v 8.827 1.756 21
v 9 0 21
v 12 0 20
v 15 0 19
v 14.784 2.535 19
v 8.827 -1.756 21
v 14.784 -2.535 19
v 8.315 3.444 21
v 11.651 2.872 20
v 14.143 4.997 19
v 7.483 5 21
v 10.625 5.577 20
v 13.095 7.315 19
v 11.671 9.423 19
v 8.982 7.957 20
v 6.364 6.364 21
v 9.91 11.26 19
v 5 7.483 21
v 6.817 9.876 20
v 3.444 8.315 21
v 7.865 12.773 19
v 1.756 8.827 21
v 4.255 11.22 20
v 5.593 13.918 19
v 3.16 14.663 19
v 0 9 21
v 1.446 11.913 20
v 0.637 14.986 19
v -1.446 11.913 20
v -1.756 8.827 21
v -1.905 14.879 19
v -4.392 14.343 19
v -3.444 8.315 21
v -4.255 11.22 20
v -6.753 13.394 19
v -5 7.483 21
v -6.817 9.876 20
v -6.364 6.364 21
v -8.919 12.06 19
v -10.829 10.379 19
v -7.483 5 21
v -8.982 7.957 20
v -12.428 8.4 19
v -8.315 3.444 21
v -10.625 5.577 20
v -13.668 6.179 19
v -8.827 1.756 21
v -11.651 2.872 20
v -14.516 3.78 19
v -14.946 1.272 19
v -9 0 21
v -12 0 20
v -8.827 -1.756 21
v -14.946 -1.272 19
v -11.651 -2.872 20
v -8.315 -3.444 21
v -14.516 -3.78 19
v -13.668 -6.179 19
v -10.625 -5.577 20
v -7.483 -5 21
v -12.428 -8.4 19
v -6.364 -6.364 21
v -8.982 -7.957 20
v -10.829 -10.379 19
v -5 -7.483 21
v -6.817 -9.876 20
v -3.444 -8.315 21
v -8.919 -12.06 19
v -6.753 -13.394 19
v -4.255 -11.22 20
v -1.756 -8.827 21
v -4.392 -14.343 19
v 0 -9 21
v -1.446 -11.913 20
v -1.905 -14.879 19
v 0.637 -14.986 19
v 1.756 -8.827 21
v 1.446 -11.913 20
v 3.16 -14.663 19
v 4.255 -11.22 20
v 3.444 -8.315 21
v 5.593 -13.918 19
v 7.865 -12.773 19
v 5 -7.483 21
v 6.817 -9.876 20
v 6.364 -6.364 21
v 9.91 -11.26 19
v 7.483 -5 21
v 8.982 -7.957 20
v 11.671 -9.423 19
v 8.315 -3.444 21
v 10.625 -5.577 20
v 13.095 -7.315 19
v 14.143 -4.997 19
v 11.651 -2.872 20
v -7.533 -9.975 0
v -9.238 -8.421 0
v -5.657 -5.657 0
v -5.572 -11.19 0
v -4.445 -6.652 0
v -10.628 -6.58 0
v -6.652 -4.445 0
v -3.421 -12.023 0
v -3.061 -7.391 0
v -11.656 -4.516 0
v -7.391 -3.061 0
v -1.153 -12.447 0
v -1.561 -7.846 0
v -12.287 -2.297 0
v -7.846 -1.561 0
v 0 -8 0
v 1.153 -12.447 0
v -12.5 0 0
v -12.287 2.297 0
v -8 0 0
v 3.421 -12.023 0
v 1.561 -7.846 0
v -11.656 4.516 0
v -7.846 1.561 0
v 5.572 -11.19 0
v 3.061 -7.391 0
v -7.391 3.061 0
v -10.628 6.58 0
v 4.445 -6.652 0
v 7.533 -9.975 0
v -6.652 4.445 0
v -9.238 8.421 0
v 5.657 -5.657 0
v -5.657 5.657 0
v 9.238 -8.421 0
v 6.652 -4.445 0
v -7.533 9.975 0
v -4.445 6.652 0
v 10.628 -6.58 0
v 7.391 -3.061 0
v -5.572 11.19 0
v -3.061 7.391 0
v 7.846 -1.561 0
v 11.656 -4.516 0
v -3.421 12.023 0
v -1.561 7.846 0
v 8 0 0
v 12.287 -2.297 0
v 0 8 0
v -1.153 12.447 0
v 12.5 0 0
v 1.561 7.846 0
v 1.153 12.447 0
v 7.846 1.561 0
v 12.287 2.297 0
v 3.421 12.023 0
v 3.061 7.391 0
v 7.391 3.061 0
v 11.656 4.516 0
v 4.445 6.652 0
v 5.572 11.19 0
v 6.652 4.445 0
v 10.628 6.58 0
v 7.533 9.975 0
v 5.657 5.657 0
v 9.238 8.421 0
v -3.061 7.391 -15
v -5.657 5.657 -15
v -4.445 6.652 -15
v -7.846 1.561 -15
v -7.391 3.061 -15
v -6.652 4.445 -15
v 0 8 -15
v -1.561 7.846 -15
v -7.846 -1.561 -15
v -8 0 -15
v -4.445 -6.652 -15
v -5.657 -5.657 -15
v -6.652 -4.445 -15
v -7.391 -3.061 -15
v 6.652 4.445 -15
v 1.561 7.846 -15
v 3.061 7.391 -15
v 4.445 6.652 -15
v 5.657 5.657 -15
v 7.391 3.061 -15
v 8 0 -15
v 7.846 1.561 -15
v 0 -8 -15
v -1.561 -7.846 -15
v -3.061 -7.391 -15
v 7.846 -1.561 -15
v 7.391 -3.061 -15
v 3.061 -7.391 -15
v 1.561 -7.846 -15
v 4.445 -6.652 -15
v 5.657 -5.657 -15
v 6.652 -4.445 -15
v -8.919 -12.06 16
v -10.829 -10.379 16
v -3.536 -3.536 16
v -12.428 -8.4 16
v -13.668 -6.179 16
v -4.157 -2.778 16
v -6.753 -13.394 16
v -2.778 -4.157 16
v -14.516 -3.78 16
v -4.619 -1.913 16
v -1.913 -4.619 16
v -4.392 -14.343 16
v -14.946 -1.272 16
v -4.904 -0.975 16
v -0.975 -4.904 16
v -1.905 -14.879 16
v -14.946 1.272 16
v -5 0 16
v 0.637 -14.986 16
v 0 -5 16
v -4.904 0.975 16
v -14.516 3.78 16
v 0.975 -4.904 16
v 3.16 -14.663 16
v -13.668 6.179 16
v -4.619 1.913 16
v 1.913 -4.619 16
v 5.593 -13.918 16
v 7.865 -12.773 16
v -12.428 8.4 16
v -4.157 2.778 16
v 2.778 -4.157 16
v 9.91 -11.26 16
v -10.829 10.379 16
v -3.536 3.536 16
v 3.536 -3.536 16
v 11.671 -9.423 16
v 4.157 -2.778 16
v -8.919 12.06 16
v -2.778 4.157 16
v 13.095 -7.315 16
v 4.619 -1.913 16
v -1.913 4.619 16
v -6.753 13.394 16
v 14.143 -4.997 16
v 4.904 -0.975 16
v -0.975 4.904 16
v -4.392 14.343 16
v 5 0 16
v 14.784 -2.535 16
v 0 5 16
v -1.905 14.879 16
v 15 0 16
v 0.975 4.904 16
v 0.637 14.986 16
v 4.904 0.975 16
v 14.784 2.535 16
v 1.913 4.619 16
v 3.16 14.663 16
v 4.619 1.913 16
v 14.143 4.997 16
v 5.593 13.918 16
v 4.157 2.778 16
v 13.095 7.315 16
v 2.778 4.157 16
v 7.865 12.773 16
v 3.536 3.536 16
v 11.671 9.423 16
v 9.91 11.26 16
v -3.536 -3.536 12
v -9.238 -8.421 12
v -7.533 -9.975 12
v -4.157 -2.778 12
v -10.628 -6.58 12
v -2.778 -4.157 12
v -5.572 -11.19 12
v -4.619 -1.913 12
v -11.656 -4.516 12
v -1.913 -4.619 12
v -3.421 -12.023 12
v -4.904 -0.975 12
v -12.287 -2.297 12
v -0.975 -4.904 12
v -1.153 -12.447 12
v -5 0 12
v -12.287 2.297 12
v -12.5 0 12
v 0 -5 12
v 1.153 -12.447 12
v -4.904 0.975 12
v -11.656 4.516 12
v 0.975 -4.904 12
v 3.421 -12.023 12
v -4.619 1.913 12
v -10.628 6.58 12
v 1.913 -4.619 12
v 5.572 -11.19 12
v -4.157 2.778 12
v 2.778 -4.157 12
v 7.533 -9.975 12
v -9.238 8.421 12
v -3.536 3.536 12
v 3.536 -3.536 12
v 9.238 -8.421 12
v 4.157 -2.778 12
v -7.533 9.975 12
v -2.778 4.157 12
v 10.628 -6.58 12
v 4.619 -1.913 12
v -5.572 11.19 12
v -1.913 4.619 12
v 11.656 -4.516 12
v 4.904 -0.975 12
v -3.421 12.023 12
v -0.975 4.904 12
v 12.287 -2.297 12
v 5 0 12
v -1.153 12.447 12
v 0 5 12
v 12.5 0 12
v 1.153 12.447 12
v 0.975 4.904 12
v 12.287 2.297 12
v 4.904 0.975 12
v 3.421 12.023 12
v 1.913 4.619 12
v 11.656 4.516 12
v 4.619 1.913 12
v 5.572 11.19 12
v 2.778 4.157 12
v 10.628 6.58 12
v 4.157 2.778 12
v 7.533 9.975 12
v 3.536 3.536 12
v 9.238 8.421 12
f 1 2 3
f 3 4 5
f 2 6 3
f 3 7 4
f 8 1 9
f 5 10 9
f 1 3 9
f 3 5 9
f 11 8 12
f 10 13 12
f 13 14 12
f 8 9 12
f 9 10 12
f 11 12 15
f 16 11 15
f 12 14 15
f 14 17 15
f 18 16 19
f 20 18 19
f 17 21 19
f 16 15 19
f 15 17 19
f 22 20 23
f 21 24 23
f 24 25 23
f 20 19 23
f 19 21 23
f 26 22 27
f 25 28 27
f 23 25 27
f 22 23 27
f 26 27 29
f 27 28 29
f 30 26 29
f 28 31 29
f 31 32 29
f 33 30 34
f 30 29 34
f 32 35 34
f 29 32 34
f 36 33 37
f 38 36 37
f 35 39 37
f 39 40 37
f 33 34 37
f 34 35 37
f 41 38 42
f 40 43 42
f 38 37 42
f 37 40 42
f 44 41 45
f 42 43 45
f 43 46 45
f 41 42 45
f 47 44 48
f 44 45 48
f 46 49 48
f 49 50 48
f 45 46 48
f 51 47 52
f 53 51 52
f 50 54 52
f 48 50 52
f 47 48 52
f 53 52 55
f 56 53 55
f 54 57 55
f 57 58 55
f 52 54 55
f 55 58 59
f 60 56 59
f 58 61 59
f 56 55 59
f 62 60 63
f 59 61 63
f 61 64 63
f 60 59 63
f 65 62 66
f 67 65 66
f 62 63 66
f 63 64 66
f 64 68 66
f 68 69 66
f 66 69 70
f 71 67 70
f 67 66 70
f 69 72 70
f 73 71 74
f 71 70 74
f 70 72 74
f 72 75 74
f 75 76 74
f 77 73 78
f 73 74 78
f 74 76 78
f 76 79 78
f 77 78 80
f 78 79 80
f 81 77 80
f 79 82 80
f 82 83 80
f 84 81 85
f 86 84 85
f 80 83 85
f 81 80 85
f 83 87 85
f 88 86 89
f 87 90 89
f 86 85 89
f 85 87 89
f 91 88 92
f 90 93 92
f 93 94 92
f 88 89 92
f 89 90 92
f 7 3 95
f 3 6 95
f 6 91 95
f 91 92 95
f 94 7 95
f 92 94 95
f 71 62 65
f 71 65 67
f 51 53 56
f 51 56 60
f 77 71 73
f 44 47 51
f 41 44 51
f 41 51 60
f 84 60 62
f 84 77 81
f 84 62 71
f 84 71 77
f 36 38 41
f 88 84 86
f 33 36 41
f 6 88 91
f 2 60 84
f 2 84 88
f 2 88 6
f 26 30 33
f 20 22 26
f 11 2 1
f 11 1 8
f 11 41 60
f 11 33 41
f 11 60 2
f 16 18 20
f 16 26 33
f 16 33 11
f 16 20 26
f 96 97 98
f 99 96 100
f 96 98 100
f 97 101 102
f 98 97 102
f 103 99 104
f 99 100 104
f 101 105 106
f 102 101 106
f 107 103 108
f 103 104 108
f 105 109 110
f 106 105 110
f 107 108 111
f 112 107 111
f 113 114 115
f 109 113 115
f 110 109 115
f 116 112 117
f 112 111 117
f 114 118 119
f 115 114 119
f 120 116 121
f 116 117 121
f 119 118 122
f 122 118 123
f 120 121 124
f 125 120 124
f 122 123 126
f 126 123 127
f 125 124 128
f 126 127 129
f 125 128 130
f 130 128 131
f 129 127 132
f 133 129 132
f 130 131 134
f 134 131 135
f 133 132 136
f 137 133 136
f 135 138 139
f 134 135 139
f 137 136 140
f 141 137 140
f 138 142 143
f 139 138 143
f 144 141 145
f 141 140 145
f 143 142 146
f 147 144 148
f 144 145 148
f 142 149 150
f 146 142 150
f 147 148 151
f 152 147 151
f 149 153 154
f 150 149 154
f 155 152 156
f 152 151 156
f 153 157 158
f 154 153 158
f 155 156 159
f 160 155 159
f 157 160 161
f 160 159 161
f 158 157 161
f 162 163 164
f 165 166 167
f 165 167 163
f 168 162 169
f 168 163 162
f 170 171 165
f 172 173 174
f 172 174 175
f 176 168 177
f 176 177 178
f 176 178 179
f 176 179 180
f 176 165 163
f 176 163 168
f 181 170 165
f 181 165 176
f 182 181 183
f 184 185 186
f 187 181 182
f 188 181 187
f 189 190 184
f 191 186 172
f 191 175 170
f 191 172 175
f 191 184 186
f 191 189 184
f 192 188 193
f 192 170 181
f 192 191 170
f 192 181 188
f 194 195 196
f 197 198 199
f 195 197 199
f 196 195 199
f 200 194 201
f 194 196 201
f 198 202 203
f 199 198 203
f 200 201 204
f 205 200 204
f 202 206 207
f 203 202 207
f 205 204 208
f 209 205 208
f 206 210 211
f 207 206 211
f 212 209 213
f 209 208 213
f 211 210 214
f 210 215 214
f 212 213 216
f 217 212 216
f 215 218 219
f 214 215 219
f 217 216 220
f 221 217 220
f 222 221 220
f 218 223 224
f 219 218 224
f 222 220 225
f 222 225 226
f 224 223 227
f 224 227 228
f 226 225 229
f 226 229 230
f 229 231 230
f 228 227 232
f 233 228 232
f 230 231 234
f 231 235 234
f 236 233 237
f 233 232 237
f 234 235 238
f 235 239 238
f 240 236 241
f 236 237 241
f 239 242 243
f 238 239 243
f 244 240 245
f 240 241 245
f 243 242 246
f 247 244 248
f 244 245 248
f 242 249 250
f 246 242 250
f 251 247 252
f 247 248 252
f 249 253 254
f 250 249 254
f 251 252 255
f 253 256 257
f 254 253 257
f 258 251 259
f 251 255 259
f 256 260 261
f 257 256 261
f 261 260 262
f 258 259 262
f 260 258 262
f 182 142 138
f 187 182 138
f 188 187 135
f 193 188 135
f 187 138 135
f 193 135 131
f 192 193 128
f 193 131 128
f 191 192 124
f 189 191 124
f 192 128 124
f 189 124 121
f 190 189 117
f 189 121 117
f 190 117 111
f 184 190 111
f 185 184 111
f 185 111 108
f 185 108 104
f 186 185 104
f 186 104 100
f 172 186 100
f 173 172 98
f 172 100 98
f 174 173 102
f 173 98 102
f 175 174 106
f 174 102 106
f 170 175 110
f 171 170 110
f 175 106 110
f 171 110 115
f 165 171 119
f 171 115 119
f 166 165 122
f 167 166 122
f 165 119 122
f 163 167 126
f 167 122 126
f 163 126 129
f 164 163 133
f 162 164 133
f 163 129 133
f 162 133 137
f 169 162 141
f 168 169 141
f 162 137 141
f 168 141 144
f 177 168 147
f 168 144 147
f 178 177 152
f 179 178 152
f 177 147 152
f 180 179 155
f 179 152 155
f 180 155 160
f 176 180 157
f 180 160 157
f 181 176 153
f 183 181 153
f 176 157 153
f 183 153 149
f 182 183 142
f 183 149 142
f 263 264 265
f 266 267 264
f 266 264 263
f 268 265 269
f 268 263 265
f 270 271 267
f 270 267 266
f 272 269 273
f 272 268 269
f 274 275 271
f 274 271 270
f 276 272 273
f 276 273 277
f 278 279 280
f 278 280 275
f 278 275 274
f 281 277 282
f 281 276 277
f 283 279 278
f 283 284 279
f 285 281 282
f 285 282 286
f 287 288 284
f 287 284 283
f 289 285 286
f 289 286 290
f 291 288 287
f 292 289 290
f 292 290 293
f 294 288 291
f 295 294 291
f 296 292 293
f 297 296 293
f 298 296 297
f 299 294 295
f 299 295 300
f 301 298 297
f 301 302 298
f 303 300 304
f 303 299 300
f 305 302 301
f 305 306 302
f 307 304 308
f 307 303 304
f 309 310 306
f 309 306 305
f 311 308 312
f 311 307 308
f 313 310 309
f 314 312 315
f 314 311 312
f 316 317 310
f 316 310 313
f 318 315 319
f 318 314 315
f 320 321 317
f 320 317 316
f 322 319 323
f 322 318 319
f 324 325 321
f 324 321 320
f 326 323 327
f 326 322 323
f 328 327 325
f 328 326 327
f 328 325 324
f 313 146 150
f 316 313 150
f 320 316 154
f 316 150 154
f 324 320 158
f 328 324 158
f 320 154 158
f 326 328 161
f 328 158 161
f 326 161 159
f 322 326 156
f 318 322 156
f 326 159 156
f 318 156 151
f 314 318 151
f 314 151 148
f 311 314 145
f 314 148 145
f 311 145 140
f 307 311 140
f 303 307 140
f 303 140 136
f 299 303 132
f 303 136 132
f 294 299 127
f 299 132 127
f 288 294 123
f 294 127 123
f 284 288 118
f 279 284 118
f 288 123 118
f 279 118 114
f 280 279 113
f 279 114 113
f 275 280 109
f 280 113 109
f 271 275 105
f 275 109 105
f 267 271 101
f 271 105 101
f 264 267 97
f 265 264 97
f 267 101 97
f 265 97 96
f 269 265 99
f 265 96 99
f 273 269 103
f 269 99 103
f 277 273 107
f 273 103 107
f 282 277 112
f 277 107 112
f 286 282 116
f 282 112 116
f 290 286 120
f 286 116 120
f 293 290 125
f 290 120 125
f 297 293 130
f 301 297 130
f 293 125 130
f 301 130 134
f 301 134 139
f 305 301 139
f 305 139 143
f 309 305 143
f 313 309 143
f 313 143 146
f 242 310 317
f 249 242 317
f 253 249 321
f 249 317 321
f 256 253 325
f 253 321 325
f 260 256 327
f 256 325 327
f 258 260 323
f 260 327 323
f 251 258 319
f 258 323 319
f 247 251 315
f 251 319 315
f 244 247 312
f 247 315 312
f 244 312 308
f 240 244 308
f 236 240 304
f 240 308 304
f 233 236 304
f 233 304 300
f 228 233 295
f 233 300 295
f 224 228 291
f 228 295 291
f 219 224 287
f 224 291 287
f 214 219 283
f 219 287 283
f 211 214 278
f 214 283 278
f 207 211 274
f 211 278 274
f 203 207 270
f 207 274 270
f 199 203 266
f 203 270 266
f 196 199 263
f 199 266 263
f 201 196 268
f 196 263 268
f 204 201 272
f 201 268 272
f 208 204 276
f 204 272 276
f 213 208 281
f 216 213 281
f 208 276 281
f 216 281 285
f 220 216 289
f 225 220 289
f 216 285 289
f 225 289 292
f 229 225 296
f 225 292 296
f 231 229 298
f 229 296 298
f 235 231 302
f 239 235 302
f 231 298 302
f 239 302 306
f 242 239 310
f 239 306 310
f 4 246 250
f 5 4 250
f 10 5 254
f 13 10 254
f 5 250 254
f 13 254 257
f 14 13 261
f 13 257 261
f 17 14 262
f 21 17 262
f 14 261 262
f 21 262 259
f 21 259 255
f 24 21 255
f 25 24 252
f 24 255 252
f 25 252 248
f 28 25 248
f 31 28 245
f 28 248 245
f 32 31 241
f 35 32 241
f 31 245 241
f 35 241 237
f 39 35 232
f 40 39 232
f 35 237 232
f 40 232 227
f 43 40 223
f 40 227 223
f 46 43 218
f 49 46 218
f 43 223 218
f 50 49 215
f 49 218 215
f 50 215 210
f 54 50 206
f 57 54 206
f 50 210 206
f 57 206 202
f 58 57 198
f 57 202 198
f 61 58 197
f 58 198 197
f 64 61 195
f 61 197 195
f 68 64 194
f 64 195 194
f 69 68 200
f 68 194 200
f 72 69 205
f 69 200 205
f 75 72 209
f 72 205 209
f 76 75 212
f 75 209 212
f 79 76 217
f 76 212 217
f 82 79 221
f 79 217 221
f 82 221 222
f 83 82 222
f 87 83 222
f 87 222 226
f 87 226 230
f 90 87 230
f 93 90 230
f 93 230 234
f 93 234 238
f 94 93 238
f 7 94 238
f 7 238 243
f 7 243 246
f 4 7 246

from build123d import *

# Parameters (mm, degrees)
F0_R     = 12.5
F1_DEPTH = 12
F2_R     = 8
F3_DEPTH = 15
F4_R     = 5
F5_DEPTH = 4
F6_R     = 15
F6_R_2   = 5
F7_DEPTH = 5
F8_SIZE2 = 2
F8_SIZE  = 6


with BuildPart() as f1:
    # F0 (on Top) → F1 (new body)
    with BuildSketch(Plane.XY):
        Circle(F0_R)
    extrude(amount=F1_DEPTH)

    # F2 (on face) → F3 (join)
    with BuildSketch(Plane(origin=(0, 0, 0), x_dir=(1, 0, 0), z_dir=(0, 0, -1))):
        Circle(F2_R)
    extrude(amount=F3_DEPTH)

    # F4 (on face) → F5 (join)
    with BuildSketch(Plane.XY.offset(12)):
        Circle(F4_R)
    extrude(amount=F5_DEPTH)

    # F6 (on face) → F7 (join)
    with BuildSketch(Plane.XY.offset(16)):
        Circle(F6_R)
        Circle(F6_R_2, mode=Mode.SUBTRACT)
        Circle(F6_R_2)
    extrude(amount=F7_DEPTH)

    # F8
    f8_edges = [f1.edges().sort_by_distance(p)[0] for p in [
        (-15, 0, 21),
    ]]
    f8_side = f1.faces().sort_by_distance((0, 0, 21))[0]
    chamfer(f8_edges, length=F8_SIZE, length2=F8_SIZE2, reference=f8_side)


solid = f1.part
